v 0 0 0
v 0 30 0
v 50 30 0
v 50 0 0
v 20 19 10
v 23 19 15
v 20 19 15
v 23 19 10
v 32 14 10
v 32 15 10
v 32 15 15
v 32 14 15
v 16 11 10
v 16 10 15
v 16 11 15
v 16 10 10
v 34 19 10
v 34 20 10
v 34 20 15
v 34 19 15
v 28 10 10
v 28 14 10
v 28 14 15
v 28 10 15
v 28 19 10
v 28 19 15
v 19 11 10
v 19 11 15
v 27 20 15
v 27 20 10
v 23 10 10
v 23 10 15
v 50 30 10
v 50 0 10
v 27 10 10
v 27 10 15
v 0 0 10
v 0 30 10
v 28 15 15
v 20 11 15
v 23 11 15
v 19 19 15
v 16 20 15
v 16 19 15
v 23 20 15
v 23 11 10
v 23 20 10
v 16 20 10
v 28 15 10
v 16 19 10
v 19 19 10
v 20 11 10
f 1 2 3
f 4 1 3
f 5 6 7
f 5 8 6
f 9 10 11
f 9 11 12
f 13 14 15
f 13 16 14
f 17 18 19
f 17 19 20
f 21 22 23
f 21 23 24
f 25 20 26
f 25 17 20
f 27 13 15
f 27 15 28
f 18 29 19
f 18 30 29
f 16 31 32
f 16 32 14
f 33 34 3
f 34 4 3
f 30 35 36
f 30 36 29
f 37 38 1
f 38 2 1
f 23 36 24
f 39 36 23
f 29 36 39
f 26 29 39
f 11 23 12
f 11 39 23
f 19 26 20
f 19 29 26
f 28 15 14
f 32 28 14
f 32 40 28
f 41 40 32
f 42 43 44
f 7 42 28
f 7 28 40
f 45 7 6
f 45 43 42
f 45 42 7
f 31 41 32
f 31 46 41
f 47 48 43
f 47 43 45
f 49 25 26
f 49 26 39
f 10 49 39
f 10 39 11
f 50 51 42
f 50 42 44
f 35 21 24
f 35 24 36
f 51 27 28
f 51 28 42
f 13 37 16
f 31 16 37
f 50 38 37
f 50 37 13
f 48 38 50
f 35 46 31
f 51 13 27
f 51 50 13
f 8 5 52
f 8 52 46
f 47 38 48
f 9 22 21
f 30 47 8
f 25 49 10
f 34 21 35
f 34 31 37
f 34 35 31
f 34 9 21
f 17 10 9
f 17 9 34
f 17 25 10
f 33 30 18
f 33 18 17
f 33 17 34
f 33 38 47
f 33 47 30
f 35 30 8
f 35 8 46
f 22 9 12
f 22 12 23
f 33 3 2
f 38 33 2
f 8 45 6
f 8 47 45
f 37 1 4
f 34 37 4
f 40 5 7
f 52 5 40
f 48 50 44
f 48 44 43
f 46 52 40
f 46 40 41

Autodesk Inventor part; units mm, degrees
ref_plane "YZ Plane" through (0, 0, 0) normal (1, 0, 0) x (0, 1, 0)
ref_plane "XZ Plane" through (0, 0, 0) normal (0, 1, 0) x (-1, 0, 0)
ref_plane "XY Plane" through (0, 0, 0) normal (0, 0, 1) x (1, 0, 0)
sketch "Sketch1" plane through (0, 0, 0) normal (0, 0, 1) x (1, 0, 0)
  line L0 (0, 0) -> (50, 0)
  line L1 (50, 0) -> (50, 30)
  line L2 (50, 30) -> (0, 30)
  line L3 (0, 30) -> (0, 0)
  dimension "d0" = 50
  dimension "d1" = 30
extrude "Extrusion1" add sketch "Sketch1" along normal blind 10
sketch "Sketch2" plane through (0, 0, 10) normal (0, 0, 1) x (1, 0, 0)
  line L0 (0, 0) -> (50, 0) projected
  line L1 (50, 30) -> (0, 30) projected
  line L2 (0, 0) -> (50, 0)
  line L3 (50, 0) -> (50, 30)
  line L4 (50, 30) -> (0, 30)
  line L5 (0, 30) -> (0, 0)
  line L6 (16, 20) -> (23, 20)
  line L7 (23, 20) -> (23, 19)
  line L8 (23, 19) -> (20, 19)
  line L9 (20, 19) -> (20, 11)
  line L10 (20, 11) -> (23, 11)
  line L11 (23, 11) -> (23, 10)
  line L12 (23, 10) -> (16, 10)
  line L13 (16, 10) -> (16, 11)
  line L14 (16, 11) -> (19, 11)
  line L15 (19, 11) -> (19, 19)
  line L16 (19, 19) -> (16, 19)
  line L17 (16, 19) -> (16, 20)
  line L18 (27, 10) -> (27, 20)
  line L19 (27, 20) -> (34, 20)
  line L20 (34, 20) -> (34, 19)
  line L21 (34, 19) -> (28, 19)
  line L22 (28, 19) -> (28, 15)
  line L23 (28, 15) -> (32, 15)
  line L24 (32, 15) -> (32, 14)
  line L25 (32, 14) -> (28, 14)
  line L26 (28, 14) -> (28, 10)
  line L27 (28, 10) -> (27, 10)
  point P0 (17.5, 19)
  point P1 (16, 10.5)
  point P2 (23, 10.5)
  point P3 (23, 19.5)
  point P4 (31, 19)
  point P5 (30, 14)
  point P6 (27, 15)
  dimension "d4" = 1
  dimension "d5" = 1
  dimension "d6" = 1
  dimension "d7" = 3
  dimension "d8" = 3
  dimension "d9" = 10
  dimension "d10" = 10
  dimension "d11" = 30
  dimension "d12" = 50
  dimension "d13" = 23
  dimension "d14" = 23
  dimension "d15" = 10
  dimension "d16" = 1
  dimension "d17" = 1
  dimension "d18" = 1
  dimension "d19" = 7
  dimension "d20" = 4
  dimension "d21" = 10
  dimension "d22" = 4
extrude "Extrusion2" add sketch "Sketch2" along normal blind 5 contours L6 L7 L8 L9 L10 L11 L12 L13 L14 L15 L16 L17 | L18 L19 L20 L21 L22 L23 L24 L25 L26 L27
equation "\"d4\" = d5"
equation "\"d6\" = d5"
equation "\"d8\" = d7"
equation "\"d10\" = -0.5 * d9 + 0.5 * d11"
equation "\"d14\" = d13"
equation "\"d15\" = d10"
equation "\"d16\" = d5"
equation "\"d17\" = d5"
equation "\"d18\" = d5"
equation "\"d19\" = d8 + d7 + d5"
equation "\"d20\" = d7 + d5"
equation "\"d21\" = d9"
equation "\"d22\" = -0.5 * d17 + 0.5 * d21 - 0.5 * d16"
properties part number "Names"
